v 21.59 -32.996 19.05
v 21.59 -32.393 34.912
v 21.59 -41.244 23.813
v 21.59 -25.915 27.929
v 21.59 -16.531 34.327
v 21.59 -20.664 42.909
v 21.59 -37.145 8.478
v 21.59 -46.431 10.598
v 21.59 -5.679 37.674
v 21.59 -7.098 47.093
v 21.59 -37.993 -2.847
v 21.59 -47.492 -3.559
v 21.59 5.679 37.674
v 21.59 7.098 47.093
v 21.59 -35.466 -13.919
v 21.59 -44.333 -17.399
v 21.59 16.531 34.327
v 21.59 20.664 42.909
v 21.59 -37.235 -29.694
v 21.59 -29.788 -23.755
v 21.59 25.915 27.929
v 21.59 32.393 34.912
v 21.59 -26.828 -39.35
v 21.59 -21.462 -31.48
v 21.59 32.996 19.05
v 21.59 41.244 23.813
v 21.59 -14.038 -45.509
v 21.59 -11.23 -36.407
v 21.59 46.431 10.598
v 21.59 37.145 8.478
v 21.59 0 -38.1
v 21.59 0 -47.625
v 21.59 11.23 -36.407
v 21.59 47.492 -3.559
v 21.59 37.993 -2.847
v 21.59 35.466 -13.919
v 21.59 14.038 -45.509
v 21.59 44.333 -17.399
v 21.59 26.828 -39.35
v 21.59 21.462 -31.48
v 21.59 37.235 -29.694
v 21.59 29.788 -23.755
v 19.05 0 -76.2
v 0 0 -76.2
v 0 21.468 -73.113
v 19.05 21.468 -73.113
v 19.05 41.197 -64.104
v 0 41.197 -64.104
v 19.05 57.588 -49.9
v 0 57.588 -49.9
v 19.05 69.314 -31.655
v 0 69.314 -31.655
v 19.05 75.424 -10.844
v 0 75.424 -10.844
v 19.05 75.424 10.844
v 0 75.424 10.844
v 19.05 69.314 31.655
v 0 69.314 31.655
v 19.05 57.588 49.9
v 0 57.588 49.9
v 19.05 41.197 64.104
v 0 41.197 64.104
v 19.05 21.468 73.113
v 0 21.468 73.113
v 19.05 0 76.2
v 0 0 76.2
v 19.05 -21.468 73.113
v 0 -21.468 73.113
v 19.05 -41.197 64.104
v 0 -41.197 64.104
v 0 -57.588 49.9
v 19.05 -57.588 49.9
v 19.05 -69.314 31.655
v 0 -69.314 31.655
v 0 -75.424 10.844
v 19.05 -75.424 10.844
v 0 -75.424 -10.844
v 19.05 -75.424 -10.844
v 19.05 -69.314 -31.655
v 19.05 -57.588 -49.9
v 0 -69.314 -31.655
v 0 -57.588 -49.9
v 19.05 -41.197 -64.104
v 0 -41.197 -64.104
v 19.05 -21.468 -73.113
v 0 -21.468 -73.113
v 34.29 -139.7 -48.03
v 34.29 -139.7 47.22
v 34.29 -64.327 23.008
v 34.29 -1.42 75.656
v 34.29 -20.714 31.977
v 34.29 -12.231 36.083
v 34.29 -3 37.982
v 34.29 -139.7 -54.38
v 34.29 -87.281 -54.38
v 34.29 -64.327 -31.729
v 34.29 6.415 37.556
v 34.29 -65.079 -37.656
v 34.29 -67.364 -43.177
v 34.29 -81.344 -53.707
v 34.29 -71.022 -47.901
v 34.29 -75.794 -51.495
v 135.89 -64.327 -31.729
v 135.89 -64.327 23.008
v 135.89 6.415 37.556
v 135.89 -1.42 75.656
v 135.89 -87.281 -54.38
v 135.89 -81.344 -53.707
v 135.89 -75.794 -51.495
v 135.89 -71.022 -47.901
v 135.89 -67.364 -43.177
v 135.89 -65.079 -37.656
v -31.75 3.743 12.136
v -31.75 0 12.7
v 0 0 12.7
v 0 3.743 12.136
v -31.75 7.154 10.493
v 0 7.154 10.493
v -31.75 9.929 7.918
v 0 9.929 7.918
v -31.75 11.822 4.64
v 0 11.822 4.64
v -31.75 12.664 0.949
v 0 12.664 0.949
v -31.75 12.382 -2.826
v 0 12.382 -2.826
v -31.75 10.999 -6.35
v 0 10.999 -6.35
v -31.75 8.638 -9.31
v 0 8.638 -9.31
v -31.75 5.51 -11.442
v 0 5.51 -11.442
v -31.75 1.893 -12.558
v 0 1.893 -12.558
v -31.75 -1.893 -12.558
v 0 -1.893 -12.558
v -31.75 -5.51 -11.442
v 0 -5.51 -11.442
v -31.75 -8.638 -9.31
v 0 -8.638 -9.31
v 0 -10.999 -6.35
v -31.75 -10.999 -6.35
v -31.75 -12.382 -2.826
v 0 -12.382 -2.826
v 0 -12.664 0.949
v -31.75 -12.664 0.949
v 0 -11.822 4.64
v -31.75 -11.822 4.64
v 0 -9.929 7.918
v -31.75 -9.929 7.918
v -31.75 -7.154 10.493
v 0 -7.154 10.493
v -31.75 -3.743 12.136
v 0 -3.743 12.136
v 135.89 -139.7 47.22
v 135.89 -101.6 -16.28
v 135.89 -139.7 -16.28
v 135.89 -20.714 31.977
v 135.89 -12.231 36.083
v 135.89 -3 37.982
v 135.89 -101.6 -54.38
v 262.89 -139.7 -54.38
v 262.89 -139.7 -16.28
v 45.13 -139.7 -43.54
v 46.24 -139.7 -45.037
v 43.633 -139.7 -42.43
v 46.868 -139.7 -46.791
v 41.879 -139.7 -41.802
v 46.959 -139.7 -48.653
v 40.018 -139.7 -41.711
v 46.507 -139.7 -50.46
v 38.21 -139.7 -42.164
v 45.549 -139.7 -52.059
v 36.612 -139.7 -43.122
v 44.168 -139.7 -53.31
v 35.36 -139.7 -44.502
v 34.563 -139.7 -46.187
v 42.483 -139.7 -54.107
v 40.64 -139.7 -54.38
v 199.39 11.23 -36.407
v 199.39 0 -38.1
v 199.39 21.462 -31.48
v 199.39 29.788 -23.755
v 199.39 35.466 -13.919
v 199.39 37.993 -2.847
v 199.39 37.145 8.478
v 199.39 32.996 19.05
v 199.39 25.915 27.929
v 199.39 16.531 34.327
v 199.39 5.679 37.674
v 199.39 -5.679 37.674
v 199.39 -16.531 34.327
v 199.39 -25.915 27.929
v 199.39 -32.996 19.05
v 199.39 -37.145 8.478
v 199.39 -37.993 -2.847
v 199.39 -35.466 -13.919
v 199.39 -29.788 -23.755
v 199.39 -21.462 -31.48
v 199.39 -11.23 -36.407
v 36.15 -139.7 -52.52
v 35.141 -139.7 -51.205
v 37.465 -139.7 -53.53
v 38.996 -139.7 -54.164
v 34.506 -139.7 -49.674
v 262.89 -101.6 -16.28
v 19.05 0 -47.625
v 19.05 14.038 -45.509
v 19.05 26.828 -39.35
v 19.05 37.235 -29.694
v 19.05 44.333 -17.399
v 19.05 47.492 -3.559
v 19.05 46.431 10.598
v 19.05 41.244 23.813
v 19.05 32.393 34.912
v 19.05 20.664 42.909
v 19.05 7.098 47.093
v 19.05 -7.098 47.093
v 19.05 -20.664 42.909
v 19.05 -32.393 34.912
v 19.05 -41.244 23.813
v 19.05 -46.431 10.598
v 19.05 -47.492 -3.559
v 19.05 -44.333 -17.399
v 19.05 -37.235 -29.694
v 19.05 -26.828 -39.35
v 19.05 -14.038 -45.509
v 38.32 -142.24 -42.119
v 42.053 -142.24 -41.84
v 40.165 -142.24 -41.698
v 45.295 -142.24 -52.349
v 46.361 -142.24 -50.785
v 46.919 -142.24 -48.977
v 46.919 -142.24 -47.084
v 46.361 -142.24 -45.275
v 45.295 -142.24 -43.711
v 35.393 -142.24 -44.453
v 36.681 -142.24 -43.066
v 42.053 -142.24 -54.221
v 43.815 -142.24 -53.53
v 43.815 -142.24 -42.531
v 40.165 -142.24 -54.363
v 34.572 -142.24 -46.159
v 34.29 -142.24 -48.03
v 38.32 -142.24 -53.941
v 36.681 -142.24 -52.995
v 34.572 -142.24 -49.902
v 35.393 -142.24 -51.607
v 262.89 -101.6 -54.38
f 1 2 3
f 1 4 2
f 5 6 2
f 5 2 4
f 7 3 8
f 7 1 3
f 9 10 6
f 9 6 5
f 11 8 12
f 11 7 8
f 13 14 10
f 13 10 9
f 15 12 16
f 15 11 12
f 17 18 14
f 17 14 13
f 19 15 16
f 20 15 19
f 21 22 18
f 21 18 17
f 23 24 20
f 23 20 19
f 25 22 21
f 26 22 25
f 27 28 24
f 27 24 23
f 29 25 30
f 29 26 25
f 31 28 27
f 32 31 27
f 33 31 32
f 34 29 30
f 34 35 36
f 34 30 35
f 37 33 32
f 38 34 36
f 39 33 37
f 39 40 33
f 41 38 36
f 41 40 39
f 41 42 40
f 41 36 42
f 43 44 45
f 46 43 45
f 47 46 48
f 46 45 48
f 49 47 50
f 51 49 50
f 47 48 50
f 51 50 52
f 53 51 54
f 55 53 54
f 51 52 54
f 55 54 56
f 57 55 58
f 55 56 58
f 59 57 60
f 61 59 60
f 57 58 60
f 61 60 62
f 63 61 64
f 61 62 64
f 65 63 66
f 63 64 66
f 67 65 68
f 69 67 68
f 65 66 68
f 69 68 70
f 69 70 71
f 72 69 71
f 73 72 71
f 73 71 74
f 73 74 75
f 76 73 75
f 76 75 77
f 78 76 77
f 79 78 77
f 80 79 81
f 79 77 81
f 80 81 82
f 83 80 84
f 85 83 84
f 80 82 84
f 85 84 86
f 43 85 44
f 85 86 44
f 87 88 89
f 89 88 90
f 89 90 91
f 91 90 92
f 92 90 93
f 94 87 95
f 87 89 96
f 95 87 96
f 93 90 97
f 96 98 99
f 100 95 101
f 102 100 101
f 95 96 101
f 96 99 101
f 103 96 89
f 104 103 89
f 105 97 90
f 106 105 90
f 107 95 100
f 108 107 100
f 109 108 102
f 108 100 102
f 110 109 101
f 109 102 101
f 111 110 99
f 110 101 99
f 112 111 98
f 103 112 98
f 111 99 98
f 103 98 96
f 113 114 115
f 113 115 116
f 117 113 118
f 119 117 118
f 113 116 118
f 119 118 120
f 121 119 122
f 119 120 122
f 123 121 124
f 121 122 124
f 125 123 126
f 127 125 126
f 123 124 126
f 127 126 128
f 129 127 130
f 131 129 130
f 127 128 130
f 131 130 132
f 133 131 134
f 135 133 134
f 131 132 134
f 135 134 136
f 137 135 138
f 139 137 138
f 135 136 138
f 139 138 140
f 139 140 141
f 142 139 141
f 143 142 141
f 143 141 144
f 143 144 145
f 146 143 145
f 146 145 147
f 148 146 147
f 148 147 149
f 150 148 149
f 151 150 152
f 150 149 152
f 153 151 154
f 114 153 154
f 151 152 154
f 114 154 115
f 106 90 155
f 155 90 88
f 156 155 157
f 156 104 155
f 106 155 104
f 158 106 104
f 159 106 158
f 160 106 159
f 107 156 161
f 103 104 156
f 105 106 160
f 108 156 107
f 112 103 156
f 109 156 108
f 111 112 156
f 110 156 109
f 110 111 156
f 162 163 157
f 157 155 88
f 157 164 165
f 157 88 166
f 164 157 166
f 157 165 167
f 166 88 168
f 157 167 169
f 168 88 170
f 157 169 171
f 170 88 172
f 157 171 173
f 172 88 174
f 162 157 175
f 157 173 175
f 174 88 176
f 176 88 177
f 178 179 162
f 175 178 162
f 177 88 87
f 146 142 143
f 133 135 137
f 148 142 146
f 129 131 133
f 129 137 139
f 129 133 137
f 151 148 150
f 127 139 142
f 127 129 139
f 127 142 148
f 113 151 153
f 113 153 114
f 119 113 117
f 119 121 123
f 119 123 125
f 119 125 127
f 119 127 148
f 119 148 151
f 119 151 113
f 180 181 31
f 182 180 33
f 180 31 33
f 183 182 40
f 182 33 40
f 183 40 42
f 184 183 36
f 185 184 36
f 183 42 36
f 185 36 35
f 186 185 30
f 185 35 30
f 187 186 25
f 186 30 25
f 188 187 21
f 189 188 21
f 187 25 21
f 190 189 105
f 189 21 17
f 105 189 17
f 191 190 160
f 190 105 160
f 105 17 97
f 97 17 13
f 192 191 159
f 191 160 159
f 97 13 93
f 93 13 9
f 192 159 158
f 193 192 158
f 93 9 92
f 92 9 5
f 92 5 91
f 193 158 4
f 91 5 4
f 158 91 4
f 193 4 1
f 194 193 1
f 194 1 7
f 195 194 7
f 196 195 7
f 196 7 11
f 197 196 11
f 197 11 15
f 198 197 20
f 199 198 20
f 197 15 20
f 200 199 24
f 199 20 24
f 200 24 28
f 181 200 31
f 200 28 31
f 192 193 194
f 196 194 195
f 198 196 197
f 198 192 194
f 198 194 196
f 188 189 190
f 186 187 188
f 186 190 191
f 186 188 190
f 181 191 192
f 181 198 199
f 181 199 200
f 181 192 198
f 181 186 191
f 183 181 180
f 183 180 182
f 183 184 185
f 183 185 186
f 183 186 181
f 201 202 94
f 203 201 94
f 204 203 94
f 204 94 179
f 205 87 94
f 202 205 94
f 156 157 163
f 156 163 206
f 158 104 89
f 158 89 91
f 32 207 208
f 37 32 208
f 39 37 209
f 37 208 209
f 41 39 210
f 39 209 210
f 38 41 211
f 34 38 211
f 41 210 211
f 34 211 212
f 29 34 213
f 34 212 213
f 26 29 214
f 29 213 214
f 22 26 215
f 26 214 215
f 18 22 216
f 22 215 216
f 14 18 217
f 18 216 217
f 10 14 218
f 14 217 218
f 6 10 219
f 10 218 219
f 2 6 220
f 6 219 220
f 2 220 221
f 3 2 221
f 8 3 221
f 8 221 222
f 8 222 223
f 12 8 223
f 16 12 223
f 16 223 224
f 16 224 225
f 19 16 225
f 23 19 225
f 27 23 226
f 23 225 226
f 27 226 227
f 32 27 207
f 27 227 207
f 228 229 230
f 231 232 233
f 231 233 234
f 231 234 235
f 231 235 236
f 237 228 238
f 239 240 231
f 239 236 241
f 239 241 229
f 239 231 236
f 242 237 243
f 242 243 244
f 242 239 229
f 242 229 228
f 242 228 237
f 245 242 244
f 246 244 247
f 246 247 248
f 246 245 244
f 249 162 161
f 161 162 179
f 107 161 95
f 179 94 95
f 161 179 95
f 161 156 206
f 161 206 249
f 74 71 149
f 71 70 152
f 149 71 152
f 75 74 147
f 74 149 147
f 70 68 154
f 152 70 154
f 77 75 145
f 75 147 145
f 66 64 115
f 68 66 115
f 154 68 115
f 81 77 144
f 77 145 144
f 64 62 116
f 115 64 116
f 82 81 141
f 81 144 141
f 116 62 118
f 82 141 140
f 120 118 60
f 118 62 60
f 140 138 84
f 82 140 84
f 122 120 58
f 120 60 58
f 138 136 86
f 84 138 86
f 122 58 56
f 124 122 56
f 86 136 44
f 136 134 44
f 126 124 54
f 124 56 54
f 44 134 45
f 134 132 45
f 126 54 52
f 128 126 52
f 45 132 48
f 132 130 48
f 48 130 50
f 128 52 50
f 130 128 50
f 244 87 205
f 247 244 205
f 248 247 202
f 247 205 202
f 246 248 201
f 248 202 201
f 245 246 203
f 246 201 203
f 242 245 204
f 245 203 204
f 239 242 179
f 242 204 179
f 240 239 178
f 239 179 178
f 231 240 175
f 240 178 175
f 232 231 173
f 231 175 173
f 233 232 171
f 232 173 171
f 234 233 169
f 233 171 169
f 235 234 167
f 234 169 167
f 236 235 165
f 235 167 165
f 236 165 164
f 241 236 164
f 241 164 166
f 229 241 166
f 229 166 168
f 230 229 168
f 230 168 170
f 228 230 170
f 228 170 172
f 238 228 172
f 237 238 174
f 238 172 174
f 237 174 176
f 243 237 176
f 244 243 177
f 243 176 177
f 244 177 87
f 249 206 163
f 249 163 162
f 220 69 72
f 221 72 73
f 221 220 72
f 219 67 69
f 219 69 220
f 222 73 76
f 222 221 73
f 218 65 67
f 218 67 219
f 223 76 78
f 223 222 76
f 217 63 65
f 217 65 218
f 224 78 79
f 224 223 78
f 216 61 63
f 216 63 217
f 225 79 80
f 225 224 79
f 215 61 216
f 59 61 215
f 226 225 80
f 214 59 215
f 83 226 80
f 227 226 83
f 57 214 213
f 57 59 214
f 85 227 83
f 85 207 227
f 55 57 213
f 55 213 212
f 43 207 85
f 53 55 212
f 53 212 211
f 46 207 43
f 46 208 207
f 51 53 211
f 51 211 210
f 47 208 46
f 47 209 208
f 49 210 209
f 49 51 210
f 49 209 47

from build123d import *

# Parameters (mm, degrees)
SKETCH1_R           = 76.2
BOSS_EXTRUDE1_DEPTH = 19.05
SKETCH2_R           = 47.625
BOSS_EXTRUDE2_DEPTH = 2.54
SKETCH3_R           = 38.1
BOSS_EXTRUDE3_DEPTH = 177.8
SKETCH4_R           = 12.7
BOSS_EXTRUDE4_DEPTH = 31.75
BOSS_EXTRUDE5_DEPTH = 101.6
SKETCH8_W           = 38.1
SKETCH8_H           = 38.1
BOSS_EXTRUDE6_DEPTH = 127
SKETCH9_R           = 6.35
BOSS_EXTRUDE7_DEPTH = 2.54


with BuildPart() as part:
    # Sketch1 → Boss-Extrude1 (new body)
    with BuildSketch(Plane(origin=(0, 0, 0), x_dir=(0, 0, -1), z_dir=(1, 0, 0))):
        Circle(SKETCH1_R)
    extrude(amount=BOSS_EXTRUDE1_DEPTH)

    # Sketch2 → Boss-Extrude2 (add)
    with BuildSketch(Plane(origin=(19.05, 0, 0), x_dir=(0, 0, -1), z_dir=(1, 0, 0))):
        Circle(SKETCH2_R)
    extrude(amount=BOSS_EXTRUDE2_DEPTH)

    # Sketch3 → Boss-Extrude3 (add)
    with BuildSketch(Plane(origin=(21.59, 0, 0), x_dir=(0, 0, -1), z_dir=(1, 0, 0))):
        Circle(SKETCH3_R)
    extrude(amount=BOSS_EXTRUDE3_DEPTH)

    # Sketch4 → Boss-Extrude4 (add)
    with BuildSketch(Plane.ZY):
        Circle(SKETCH4_R)
    extrude(amount=BOSS_EXTRUDE4_DEPTH)

    # Sketch7 → Boss-Extrude5 (add)
    with BuildSketch(Plane(origin=(34.29, 0, 0), x_dir=(0, 0, -1), z_dir=(1, 0, 0))):
        with BuildLine():
            Line((-37.556058373, 6.415019833), (-75.656058373, -1.41999022))
            Line((-75.656058373, -1.41999022), (-47.219699668, -139.7))
            Line((-47.219699668, -139.7), (54.380300332, -139.7))
            Line((54.380300332, -139.7), (54.380300332, -109.367342085))
            Line((54.380300332, -109.367342085), (54.380300332, -87.28092842))
            ThreePointArc((54.380300332, -87.28092842), (47.900567457, -71.021979596), (31.729146835, -64.326794005))
            Line((31.729146835, -64.326794005), (-23.008477729, -64.326794005))
            Line((-23.008477729, -64.326794005), (-37.556058373, 6.415019833))
        make_face()
    extrude(amount=BOSS_EXTRUDE5_DEPTH)

    # Sketch8 → Boss-Extrude6 (add)
    with BuildSketch(Plane(origin=(135.89, 0, 0), x_dir=(0, 0, -1), z_dir=(1, 0, 0))):
        with Locations((35.330300332, -120.65)):
            Rectangle(SKETCH8_W, SKETCH8_H)
    extrude(amount=BOSS_EXTRUDE6_DEPTH)

    # Sketch9 → Boss-Extrude7 (add)
    with BuildSketch(Plane(origin=(0, -139.7, 0), x_dir=(-1, 0, 0), z_dir=(0, -1, 0))):
        with Locations((-40.64, 48.030300332)):
            Circle(SKETCH9_R)
    extrude(amount=BOSS_EXTRUDE7_DEPTH)


solid = part.part
